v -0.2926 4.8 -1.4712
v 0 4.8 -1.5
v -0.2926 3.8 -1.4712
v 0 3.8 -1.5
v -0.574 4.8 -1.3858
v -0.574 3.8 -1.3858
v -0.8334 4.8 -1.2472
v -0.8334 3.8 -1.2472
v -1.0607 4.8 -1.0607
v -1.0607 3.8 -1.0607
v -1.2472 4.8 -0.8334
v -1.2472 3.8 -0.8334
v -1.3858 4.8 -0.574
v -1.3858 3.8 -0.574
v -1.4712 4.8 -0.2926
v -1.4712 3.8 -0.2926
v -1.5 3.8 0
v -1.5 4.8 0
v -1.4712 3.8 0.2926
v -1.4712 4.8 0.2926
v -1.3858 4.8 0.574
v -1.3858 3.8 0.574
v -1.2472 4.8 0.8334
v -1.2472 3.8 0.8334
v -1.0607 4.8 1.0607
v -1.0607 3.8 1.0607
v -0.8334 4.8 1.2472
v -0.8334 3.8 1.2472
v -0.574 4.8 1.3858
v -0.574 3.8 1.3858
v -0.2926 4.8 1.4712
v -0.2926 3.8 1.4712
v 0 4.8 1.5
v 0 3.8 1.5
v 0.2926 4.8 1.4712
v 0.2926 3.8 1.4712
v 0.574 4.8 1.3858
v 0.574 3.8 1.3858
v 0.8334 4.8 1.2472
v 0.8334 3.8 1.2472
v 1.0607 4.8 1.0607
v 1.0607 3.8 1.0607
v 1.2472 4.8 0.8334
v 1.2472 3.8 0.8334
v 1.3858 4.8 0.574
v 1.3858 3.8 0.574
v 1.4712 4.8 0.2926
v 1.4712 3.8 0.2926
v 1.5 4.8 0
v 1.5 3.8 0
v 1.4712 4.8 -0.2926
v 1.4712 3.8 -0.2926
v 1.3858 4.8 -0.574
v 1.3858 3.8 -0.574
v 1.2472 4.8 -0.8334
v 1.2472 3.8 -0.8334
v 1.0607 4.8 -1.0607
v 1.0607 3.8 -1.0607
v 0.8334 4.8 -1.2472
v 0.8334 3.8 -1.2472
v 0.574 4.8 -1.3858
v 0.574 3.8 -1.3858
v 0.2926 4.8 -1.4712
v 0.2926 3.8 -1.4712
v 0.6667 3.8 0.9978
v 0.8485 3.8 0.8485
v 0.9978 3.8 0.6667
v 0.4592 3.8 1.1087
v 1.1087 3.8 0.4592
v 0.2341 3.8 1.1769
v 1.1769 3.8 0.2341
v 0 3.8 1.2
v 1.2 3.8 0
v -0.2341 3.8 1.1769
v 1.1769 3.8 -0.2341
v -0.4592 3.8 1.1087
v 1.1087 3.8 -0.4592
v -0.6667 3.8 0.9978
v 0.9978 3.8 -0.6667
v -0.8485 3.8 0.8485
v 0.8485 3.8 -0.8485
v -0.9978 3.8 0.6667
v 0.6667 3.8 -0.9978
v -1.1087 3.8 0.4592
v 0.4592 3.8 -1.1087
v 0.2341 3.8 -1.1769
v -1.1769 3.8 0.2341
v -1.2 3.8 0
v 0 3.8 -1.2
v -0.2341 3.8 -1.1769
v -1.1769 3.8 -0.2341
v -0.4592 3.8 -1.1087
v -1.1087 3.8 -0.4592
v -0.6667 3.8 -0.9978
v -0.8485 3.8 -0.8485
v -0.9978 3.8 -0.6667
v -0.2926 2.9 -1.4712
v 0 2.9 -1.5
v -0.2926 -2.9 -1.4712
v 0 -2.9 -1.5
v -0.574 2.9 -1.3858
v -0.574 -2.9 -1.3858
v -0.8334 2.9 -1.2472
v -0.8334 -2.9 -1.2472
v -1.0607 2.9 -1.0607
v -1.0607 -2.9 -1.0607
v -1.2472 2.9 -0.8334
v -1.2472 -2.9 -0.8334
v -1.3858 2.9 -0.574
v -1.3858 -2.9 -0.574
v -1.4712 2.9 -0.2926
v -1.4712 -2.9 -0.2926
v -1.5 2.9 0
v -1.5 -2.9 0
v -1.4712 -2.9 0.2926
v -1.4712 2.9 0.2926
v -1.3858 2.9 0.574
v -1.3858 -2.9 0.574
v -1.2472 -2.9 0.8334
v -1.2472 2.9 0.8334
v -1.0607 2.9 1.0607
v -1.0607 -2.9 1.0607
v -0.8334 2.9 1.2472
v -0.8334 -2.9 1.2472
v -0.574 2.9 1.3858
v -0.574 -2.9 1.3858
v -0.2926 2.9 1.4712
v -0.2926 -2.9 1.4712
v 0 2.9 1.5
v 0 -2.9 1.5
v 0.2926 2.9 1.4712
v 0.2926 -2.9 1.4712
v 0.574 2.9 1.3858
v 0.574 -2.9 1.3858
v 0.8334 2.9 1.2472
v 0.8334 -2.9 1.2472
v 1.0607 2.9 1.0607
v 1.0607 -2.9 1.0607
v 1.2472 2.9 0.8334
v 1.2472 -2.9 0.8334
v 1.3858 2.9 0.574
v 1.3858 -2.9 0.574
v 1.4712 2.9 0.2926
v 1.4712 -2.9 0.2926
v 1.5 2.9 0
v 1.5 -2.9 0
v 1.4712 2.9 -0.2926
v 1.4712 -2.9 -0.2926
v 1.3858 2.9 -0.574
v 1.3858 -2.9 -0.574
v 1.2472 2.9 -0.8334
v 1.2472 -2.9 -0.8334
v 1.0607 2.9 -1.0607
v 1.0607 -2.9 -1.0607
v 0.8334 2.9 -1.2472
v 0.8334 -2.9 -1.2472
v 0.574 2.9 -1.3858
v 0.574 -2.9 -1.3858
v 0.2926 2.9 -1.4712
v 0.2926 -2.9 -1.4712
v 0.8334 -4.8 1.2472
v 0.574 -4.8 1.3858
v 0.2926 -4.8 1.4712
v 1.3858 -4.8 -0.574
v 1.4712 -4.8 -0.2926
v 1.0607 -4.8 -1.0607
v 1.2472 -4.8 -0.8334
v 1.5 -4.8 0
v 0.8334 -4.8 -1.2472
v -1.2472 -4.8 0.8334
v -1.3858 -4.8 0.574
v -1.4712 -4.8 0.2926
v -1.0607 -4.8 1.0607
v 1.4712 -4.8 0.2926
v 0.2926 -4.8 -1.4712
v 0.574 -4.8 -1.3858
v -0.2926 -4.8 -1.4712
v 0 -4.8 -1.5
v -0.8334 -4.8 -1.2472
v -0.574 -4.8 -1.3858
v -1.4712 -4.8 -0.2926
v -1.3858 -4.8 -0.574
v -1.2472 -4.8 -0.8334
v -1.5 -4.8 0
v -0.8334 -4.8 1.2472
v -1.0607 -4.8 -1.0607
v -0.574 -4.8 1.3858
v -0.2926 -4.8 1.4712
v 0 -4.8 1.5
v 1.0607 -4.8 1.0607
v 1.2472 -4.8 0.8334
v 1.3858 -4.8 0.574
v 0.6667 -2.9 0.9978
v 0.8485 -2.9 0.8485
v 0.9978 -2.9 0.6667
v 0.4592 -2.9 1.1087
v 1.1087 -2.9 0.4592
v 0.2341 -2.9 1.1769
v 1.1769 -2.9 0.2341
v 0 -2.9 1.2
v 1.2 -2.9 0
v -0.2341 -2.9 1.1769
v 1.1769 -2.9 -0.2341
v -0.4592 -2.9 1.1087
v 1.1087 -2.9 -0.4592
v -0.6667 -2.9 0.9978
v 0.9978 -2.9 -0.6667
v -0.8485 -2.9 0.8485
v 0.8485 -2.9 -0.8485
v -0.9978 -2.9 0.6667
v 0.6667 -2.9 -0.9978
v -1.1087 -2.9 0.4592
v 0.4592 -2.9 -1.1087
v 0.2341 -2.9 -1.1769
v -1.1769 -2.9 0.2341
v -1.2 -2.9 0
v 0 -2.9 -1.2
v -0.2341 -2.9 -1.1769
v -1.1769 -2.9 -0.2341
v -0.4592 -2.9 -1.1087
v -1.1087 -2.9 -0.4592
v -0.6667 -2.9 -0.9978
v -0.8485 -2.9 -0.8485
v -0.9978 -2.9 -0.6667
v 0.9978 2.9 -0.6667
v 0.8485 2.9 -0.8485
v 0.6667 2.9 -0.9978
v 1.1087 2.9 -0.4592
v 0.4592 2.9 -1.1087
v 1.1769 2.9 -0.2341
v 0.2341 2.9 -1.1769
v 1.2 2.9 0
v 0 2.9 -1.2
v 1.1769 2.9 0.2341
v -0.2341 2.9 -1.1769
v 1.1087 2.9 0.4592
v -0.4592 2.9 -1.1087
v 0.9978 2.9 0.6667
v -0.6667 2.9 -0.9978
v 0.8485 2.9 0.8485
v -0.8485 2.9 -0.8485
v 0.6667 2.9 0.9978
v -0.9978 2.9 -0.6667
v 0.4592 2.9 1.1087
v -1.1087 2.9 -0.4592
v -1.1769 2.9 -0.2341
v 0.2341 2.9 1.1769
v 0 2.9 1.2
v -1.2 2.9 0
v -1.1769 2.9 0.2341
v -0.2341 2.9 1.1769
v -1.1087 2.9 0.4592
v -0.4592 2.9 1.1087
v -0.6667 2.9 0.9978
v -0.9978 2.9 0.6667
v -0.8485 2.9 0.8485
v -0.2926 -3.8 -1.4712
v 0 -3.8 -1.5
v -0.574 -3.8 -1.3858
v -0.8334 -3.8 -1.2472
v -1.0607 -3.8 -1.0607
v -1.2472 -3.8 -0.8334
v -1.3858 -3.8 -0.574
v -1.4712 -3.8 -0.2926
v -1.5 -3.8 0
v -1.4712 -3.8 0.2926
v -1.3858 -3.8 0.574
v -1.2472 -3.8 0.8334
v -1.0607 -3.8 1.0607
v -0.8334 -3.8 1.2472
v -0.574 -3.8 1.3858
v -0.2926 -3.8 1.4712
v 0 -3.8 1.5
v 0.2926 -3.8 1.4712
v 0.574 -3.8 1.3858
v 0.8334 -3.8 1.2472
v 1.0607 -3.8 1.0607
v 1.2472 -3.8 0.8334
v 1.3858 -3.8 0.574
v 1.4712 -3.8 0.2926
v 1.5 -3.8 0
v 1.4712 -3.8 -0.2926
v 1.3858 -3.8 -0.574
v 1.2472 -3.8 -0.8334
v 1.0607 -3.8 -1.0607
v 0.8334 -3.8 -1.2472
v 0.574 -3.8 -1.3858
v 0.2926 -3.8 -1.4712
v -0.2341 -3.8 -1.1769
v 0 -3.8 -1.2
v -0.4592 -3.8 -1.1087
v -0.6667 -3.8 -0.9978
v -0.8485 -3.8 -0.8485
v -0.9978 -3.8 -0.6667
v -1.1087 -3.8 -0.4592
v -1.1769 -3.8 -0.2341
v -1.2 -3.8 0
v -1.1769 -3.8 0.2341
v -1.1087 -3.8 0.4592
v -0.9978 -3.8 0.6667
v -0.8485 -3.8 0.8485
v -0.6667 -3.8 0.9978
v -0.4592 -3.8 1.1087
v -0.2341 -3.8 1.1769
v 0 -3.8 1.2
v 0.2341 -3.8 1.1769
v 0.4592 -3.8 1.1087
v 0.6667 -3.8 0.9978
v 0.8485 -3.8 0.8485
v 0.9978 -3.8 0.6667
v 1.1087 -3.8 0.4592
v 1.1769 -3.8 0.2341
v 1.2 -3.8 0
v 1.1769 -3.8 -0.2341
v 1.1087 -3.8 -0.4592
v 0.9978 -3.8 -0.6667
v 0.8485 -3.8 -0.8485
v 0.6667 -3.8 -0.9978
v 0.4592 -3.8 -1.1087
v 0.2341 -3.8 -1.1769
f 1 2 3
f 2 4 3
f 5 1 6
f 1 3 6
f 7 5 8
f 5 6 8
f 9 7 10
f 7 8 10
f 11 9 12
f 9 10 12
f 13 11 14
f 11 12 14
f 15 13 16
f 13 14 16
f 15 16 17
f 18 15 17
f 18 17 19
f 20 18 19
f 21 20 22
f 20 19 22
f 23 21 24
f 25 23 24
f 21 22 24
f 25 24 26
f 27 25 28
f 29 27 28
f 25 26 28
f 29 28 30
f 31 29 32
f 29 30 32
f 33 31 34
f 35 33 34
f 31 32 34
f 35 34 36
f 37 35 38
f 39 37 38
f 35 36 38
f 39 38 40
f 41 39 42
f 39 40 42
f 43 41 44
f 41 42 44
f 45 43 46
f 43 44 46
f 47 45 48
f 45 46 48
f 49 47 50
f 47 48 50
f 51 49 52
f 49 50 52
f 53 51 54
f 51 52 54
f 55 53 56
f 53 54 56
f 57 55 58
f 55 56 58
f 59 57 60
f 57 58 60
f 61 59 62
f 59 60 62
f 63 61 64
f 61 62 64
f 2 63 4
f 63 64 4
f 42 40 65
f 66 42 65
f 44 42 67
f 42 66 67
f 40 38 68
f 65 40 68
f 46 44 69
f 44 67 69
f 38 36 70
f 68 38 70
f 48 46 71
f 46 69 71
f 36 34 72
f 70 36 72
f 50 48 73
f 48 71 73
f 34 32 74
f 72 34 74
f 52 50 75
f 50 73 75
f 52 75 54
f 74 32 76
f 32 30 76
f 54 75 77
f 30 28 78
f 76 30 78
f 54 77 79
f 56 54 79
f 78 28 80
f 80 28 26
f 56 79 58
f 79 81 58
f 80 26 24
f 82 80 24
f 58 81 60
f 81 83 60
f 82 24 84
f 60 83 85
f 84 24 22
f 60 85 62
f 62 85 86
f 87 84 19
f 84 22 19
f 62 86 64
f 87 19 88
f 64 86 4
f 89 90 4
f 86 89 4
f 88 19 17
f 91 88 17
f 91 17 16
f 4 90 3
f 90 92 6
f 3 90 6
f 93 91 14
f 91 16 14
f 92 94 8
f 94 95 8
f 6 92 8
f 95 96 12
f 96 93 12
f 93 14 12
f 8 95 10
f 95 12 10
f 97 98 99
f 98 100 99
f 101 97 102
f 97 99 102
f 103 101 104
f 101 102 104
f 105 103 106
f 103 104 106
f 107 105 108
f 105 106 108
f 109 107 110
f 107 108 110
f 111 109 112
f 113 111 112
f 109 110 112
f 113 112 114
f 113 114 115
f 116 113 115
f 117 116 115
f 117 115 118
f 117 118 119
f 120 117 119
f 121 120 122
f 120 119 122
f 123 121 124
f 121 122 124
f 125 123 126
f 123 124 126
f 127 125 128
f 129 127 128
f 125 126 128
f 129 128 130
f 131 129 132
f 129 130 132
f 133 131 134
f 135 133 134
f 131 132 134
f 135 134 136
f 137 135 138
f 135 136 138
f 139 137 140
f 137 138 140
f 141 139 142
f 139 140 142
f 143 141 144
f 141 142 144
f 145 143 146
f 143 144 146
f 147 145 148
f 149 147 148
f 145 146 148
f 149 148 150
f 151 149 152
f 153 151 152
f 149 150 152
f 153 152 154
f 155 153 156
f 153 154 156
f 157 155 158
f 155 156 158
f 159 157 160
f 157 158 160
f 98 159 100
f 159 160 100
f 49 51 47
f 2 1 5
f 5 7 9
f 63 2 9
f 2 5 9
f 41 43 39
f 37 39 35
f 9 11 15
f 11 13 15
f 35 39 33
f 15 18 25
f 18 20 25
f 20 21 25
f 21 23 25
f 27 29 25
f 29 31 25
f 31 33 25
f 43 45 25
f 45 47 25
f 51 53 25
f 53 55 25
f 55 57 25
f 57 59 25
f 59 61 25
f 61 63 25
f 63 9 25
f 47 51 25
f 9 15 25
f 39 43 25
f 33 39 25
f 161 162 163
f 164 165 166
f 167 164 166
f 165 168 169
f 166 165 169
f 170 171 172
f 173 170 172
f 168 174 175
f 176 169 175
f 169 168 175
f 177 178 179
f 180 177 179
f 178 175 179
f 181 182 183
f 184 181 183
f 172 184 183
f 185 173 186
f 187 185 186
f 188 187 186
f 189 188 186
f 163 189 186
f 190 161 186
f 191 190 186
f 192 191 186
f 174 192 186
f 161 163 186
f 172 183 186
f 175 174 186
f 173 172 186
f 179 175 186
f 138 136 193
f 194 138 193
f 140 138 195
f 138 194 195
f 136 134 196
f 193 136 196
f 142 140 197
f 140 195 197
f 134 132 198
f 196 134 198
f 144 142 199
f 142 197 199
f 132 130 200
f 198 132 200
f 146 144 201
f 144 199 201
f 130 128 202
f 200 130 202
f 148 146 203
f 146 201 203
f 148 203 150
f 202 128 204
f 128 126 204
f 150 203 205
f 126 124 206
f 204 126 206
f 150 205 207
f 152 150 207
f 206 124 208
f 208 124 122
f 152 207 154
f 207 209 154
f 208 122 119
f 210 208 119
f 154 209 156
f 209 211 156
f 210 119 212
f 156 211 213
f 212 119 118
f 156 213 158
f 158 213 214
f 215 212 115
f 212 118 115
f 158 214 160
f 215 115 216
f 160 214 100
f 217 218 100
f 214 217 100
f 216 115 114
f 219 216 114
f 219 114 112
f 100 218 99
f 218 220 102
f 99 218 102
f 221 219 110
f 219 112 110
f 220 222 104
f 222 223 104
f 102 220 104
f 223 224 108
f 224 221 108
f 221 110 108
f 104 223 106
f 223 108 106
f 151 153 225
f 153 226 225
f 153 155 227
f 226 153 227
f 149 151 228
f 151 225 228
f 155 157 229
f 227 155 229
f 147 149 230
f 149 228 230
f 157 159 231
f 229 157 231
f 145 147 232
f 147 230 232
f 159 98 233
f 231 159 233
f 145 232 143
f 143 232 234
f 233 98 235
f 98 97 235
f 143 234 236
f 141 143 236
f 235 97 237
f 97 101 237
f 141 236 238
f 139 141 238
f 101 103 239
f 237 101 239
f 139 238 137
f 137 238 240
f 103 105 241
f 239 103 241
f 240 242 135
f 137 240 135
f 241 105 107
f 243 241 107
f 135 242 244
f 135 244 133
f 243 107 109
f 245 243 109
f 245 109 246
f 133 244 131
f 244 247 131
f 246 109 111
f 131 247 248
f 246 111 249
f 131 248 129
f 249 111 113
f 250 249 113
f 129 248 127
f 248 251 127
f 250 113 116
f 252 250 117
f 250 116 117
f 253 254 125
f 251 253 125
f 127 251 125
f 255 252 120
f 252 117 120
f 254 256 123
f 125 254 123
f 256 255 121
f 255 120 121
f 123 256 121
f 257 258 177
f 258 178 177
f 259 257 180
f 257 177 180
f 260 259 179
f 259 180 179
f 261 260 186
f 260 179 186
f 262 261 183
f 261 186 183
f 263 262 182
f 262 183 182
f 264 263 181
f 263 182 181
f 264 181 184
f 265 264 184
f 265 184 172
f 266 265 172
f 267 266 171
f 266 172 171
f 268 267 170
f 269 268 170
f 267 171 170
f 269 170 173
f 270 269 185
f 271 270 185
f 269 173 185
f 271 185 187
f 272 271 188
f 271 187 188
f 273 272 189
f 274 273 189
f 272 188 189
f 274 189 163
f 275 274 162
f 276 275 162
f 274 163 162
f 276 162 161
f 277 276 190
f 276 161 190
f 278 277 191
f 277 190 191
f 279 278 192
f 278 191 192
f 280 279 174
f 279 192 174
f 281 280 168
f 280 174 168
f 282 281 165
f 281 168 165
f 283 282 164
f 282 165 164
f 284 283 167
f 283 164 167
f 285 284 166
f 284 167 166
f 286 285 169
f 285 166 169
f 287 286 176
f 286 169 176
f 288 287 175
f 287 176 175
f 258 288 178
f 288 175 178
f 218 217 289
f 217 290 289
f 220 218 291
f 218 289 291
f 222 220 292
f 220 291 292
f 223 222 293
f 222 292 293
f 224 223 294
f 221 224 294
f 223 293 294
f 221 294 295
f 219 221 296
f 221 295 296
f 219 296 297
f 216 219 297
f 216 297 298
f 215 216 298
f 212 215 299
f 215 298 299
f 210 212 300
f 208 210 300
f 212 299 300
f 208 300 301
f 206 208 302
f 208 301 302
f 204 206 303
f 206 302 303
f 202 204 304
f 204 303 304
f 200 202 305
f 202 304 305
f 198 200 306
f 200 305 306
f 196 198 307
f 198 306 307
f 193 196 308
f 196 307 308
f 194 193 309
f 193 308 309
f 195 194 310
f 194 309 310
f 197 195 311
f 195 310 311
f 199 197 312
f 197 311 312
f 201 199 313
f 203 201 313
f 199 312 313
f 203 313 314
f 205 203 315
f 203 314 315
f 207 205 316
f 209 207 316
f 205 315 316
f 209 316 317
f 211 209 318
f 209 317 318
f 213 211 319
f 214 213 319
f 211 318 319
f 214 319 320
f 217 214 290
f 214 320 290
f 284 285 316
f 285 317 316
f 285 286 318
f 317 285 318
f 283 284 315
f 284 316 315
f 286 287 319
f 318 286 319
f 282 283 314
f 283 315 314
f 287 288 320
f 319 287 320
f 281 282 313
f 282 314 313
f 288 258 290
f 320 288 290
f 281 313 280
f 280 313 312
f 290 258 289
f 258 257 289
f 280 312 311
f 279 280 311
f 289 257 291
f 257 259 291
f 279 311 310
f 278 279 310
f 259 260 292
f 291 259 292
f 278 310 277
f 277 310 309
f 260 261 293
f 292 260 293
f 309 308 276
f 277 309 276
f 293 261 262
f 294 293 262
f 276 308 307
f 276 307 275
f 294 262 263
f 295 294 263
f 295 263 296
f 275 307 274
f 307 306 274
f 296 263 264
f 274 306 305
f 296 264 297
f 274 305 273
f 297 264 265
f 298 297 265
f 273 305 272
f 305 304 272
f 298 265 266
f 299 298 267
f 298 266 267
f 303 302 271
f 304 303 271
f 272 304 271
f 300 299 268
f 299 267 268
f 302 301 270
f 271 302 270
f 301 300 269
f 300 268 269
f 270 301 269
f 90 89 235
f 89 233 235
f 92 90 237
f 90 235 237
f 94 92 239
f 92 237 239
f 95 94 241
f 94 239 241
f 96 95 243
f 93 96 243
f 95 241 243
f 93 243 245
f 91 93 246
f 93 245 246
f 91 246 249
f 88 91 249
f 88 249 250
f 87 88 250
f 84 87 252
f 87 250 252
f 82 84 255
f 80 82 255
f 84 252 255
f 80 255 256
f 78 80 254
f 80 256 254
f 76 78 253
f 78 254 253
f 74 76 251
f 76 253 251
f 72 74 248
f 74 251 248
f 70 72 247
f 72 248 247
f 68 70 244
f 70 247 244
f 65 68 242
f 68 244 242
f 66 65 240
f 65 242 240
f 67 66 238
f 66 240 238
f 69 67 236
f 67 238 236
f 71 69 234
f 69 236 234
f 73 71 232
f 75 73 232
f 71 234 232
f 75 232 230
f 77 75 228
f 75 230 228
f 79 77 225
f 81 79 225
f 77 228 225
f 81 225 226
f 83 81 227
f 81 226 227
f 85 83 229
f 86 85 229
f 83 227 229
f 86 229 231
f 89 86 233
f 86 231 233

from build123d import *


with BuildPart() as part:
    # Sketch1 → Revolve1 (revolve)
    with BuildSketch(Plane.YZ, mode=Mode.PRIVATE) as revolve1_sk:
        Polygon((0, 0), (4.8, 0), (4.8, 1.5), (3.8, 1.5), (3.8, 1.2), (2.9, 1.2), (2.9, 1.5), (-2.9, 1.5), (-2.9, 1.2), (-3.8, 1.2), (-3.8, 1.5), (-4.8, 1.5), (-4.8, 0), align=None)
    revolve(revolve1_sk.sketch.rotate(Axis((0, 4.8, 0), (0, 1, 0)), 180), axis=Axis((0, 4.8, 0), (0, 1, 0)))


solid = part.part
